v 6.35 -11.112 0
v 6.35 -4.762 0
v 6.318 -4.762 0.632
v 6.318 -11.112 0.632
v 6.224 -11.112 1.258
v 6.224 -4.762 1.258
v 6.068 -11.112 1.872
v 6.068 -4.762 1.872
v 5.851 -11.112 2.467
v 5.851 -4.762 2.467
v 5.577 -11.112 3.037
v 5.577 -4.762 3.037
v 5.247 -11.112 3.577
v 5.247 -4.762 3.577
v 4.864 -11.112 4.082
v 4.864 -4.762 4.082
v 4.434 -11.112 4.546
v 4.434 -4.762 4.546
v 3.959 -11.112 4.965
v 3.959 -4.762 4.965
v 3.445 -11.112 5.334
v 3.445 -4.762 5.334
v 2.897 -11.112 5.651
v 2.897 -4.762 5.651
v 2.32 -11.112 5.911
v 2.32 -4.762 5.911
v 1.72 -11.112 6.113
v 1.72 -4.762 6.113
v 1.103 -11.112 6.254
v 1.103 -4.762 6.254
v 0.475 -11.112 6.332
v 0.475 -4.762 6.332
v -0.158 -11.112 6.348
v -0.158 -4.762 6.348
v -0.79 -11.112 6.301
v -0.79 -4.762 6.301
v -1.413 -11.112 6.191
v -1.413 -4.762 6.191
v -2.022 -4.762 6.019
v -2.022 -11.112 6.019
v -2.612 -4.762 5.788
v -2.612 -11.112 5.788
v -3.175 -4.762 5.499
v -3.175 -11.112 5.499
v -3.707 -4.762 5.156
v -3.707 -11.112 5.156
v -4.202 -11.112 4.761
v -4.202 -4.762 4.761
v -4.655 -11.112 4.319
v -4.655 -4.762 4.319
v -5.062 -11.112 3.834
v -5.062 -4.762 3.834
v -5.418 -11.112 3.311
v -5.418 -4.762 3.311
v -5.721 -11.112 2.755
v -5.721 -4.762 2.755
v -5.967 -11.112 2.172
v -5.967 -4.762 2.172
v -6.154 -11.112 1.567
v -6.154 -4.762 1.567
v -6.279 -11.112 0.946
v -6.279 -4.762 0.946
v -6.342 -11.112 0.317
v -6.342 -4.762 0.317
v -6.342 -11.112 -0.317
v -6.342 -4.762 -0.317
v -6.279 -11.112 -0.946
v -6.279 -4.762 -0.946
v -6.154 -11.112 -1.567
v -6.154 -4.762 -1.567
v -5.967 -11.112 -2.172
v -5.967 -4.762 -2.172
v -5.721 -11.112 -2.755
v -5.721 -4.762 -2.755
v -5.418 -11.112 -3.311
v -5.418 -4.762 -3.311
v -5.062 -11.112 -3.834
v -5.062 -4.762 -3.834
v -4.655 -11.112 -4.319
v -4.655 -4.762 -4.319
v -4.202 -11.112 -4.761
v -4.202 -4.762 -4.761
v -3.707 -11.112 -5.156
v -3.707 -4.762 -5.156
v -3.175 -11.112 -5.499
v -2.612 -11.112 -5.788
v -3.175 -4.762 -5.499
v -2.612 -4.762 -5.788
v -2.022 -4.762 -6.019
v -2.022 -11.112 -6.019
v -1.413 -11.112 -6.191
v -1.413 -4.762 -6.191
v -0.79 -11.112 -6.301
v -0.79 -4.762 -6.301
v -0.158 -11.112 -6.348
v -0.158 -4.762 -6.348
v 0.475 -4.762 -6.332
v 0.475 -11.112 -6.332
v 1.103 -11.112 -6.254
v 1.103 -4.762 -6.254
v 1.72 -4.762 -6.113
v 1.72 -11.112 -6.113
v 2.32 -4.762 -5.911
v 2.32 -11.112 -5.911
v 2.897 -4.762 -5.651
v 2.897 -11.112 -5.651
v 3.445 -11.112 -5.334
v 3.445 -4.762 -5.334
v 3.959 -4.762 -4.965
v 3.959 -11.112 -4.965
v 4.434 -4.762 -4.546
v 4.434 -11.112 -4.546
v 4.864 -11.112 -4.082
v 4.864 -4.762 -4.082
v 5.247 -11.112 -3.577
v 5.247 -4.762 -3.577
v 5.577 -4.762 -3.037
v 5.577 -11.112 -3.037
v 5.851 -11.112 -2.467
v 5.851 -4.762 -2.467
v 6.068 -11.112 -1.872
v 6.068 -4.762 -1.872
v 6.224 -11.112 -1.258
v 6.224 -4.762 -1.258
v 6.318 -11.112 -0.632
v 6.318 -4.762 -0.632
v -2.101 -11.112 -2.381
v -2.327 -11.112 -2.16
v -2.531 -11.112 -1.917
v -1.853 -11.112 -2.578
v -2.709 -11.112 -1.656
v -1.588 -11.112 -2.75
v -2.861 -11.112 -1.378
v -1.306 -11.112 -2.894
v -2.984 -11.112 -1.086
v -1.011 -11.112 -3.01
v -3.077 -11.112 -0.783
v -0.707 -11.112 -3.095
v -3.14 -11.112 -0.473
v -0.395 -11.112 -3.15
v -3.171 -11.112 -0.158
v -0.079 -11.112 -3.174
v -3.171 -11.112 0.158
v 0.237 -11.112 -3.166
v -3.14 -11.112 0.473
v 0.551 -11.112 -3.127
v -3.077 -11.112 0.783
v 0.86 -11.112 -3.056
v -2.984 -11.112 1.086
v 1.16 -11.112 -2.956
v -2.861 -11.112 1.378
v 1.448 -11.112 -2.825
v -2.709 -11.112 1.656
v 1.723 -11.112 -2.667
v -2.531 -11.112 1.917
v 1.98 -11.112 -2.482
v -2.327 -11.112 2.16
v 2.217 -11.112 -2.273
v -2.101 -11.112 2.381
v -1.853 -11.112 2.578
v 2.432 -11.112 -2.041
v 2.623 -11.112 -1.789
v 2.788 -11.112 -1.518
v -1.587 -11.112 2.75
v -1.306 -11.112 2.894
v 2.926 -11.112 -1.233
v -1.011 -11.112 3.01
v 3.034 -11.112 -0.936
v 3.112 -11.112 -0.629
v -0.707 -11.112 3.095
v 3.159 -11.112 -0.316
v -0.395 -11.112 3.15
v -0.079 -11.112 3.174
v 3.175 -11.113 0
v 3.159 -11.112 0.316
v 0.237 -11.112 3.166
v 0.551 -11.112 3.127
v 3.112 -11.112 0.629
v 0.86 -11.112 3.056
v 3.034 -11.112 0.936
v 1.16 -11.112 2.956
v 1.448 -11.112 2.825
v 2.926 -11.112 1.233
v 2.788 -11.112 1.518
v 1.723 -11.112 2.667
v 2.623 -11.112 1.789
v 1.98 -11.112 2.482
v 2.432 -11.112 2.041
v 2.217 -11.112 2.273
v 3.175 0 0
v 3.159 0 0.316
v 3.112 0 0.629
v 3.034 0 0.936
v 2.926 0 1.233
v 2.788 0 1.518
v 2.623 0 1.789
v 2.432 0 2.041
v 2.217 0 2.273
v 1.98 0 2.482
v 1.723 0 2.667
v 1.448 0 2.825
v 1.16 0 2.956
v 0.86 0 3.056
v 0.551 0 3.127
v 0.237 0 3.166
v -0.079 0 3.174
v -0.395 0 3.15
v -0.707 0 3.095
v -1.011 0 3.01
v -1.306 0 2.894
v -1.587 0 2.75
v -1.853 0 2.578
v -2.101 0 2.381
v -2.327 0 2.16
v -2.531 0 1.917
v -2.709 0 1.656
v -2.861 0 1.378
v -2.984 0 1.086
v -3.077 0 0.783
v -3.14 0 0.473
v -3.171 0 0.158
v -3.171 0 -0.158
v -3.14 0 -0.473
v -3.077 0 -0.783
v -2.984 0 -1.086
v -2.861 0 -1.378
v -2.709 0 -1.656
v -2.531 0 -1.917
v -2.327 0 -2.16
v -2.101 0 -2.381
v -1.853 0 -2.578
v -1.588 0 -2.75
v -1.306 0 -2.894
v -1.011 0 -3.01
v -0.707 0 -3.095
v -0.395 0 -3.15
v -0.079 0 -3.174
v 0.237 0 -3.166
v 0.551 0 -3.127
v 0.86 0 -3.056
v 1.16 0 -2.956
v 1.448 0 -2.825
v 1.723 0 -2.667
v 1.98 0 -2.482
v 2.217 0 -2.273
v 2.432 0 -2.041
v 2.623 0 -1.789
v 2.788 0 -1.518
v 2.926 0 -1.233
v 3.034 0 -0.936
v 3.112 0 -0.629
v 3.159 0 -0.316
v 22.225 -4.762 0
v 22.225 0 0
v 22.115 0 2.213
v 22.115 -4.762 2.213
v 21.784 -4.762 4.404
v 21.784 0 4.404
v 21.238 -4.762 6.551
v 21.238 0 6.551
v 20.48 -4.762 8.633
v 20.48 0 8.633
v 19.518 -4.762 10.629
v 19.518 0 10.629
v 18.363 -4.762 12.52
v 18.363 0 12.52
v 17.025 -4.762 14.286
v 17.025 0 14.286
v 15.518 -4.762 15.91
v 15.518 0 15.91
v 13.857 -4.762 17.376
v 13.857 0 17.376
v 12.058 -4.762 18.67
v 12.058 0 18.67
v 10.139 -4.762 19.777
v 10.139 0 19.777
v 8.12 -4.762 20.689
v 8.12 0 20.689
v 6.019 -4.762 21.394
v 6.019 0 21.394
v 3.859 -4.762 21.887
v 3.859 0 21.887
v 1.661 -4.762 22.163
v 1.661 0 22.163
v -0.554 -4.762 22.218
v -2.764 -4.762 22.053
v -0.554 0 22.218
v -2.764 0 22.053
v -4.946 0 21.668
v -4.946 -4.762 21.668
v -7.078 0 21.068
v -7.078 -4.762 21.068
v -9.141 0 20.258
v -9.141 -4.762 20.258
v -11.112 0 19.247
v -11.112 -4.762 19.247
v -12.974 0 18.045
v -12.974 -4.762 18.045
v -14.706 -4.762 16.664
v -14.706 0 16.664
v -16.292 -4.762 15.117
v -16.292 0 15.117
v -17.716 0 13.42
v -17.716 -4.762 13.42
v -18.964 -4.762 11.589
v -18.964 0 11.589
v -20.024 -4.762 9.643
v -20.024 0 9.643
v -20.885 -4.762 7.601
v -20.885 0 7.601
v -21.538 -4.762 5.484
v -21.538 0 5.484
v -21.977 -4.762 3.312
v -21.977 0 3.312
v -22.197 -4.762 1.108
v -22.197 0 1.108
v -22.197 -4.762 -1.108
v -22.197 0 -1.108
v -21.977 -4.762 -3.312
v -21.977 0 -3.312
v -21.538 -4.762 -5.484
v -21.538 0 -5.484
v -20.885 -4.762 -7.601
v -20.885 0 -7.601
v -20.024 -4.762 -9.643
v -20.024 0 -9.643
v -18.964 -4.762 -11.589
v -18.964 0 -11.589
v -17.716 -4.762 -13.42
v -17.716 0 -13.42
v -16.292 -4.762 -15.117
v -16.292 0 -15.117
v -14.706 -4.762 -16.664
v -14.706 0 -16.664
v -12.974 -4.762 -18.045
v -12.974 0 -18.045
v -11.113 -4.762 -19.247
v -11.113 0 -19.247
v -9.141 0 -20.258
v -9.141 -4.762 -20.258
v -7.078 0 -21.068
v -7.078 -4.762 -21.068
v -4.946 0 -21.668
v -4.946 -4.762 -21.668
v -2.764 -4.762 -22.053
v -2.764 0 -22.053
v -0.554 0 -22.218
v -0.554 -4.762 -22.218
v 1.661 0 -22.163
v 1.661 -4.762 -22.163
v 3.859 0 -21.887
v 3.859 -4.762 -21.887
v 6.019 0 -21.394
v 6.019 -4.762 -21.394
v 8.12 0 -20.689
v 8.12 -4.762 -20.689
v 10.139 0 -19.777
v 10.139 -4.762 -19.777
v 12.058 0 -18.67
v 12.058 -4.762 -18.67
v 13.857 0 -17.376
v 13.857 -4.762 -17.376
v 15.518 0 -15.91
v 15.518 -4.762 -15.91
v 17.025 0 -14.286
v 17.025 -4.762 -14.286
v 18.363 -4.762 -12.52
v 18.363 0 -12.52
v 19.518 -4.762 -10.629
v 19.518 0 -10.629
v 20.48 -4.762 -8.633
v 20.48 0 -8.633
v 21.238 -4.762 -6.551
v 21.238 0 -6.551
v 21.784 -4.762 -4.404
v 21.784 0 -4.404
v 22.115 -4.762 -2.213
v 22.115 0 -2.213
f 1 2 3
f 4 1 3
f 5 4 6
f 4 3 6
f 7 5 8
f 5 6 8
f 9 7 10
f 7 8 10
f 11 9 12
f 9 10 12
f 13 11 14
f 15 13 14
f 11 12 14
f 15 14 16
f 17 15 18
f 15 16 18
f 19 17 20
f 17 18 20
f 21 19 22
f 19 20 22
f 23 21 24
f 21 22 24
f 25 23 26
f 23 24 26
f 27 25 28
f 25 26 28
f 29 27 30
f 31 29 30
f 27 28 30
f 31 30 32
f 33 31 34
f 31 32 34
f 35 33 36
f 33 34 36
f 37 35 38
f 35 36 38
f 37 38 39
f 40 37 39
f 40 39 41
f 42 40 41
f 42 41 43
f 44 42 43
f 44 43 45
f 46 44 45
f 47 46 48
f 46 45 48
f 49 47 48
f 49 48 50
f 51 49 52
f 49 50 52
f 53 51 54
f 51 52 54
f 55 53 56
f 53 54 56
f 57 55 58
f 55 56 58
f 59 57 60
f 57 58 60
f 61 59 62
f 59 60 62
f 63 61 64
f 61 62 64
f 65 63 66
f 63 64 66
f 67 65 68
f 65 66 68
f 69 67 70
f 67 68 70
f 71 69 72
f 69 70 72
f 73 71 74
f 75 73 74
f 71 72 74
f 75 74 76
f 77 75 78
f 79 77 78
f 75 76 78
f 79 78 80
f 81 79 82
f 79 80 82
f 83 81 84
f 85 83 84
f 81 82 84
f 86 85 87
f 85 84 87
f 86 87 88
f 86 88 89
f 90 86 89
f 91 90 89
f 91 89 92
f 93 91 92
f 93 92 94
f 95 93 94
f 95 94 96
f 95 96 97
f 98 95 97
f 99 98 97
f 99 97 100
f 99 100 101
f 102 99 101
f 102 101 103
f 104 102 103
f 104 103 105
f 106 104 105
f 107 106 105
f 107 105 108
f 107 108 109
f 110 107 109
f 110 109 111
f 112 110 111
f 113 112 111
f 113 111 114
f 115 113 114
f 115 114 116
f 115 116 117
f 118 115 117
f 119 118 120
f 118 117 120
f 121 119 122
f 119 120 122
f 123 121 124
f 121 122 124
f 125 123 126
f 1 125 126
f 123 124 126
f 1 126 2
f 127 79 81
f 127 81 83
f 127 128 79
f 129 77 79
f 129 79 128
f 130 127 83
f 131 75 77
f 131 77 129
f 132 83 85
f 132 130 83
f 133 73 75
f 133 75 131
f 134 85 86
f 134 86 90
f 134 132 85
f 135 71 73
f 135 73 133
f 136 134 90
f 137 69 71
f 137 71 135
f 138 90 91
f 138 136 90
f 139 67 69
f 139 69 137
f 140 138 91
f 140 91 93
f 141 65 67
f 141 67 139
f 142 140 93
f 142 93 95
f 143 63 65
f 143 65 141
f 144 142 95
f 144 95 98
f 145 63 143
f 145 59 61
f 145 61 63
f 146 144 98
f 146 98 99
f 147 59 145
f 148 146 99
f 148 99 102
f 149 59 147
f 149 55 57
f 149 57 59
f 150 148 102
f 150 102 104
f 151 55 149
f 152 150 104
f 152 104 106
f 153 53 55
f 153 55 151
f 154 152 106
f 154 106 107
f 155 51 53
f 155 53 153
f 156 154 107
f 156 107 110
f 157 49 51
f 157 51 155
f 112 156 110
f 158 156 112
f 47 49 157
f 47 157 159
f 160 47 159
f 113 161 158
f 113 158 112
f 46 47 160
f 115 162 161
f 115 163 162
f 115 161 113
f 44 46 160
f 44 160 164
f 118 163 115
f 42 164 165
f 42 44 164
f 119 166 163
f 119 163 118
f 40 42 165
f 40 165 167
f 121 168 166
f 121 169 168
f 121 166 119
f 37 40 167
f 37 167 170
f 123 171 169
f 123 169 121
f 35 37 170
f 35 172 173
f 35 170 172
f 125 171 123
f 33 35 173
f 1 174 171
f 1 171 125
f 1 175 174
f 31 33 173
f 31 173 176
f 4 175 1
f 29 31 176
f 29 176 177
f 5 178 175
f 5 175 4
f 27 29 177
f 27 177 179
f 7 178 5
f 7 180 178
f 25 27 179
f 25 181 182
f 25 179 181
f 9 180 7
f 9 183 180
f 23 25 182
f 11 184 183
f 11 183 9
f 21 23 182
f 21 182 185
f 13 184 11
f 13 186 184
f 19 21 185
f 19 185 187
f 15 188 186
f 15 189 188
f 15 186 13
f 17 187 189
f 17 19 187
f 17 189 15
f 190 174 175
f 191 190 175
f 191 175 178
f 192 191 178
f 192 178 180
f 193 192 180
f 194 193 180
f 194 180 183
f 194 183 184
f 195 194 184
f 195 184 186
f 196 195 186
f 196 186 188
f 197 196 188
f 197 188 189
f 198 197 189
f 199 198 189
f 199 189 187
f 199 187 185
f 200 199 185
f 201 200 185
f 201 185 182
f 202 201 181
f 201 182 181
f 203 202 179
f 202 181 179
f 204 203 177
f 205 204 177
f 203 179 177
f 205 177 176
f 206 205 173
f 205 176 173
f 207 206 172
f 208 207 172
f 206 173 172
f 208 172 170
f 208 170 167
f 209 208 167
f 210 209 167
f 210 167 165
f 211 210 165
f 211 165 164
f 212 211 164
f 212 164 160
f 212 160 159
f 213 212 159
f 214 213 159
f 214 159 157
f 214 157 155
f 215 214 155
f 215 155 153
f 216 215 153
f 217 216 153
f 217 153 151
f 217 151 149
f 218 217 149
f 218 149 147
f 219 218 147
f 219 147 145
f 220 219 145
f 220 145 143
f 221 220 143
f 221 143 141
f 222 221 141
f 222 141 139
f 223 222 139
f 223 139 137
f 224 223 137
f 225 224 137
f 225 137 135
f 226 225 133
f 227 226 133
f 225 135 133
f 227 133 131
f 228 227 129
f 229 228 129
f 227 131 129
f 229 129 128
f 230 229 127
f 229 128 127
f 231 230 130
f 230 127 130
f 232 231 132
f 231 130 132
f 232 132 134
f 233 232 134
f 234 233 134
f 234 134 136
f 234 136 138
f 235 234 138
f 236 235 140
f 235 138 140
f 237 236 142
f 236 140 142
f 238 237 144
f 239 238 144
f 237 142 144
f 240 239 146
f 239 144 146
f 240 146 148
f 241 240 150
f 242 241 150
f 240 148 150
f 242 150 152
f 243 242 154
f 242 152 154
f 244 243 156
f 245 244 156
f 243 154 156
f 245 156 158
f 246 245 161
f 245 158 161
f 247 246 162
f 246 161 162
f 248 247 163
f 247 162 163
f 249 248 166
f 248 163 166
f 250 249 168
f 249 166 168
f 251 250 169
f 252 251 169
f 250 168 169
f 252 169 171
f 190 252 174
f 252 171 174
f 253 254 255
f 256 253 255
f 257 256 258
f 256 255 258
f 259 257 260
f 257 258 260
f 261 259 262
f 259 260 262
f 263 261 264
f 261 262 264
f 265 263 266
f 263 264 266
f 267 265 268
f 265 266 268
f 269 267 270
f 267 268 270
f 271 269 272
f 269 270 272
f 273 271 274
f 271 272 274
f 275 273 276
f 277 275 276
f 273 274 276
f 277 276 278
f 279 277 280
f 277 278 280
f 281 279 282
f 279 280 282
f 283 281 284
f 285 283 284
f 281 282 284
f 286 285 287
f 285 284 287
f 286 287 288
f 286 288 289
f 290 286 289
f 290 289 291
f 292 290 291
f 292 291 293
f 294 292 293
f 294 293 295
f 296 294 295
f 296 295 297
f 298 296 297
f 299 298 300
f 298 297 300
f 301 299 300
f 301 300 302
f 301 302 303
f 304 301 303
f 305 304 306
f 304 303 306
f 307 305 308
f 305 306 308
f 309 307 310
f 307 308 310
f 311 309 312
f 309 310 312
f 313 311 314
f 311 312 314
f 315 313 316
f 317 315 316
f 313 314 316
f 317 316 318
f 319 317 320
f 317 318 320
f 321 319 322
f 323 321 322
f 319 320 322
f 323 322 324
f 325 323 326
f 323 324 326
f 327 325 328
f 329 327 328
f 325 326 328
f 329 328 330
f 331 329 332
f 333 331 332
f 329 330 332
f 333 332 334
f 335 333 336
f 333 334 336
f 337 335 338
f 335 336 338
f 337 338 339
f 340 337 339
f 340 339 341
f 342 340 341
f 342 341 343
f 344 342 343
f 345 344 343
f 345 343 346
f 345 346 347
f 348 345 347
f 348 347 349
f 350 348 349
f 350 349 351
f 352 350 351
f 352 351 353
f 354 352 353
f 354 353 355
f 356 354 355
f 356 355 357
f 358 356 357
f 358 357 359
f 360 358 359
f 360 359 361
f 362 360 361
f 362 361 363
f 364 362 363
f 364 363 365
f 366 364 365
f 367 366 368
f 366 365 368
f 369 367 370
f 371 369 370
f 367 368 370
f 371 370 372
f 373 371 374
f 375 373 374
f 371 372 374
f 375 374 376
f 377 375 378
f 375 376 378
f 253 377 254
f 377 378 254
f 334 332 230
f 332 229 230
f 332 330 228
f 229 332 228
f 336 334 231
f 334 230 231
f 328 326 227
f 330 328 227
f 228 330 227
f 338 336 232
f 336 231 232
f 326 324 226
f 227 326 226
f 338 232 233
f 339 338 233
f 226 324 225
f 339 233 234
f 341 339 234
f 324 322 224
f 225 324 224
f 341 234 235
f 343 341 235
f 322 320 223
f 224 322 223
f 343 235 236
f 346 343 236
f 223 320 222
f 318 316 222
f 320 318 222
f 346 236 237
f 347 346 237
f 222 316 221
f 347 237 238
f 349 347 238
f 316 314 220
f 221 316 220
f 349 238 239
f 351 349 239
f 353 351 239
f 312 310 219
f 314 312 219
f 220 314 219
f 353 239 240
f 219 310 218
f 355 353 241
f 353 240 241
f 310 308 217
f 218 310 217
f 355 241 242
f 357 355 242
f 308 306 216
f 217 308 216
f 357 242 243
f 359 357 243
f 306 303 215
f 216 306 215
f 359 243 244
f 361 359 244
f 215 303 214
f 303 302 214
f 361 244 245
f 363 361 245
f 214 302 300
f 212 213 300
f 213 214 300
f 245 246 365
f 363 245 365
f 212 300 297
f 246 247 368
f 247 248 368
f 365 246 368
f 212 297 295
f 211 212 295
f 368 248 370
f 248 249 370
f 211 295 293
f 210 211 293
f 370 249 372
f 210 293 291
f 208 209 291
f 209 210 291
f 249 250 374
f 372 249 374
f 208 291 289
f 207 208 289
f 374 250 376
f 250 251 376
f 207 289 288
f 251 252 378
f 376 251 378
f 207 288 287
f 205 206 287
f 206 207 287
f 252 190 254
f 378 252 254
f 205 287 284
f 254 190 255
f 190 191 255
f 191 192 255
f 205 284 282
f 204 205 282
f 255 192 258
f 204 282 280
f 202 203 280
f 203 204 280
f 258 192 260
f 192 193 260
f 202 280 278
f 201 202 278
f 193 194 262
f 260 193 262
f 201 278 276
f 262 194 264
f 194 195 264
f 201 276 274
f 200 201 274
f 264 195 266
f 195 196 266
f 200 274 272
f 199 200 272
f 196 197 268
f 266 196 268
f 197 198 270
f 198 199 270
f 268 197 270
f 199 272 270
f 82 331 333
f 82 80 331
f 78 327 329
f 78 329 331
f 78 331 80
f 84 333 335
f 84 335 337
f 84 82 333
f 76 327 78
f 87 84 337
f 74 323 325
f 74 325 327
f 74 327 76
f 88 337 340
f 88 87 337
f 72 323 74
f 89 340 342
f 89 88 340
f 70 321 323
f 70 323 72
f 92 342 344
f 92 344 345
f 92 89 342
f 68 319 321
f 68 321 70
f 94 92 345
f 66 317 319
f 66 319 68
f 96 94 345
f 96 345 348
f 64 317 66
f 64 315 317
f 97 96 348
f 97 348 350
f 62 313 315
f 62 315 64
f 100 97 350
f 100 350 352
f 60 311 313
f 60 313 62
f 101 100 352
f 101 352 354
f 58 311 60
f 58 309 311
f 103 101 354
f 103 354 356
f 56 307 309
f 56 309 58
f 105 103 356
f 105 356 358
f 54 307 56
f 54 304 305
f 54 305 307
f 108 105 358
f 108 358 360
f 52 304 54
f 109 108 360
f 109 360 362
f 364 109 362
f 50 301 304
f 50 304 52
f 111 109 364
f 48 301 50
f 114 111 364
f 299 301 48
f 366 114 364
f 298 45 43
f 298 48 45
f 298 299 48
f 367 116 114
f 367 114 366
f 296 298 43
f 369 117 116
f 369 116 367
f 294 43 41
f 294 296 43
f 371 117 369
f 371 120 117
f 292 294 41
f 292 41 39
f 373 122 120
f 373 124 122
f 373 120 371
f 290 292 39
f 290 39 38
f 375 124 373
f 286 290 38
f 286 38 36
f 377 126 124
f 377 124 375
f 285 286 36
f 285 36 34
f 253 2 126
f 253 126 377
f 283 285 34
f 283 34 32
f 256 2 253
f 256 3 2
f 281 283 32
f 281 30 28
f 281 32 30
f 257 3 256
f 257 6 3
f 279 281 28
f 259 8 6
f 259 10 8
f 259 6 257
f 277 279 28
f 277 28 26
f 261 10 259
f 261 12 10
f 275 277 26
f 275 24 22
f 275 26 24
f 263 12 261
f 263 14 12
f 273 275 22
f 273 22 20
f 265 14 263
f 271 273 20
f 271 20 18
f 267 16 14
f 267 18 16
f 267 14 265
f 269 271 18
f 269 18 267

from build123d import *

# Parameters (mm, degrees)
F0_R          = 22.225
F1_DEPTH      = 4.7625
F2_R          = 6.35
F3_DEPTH      = 6.35
F4_R          = 3.175
F5_DEPTH      = 25.4
F5_DEPTH_BACK = 73


# Not quite as in the source:
# - an extrude ends at something that could not be found from the text; its depth is read off the source's solid


with BuildPart() as f1:
    # F0 (on Front) → F1 (new body)
    with BuildSketch(Plane.XZ):
        Circle(F0_R)
    extrude(amount=F1_DEPTH)

    # F2 (on face) → F3 (join)
    with BuildSketch(Plane.XZ.offset(4.7625)):
        Circle(F2_R)
    extrude(amount=F3_DEPTH)

    # F4 (on face) → F5 (cut, two sides)
    with BuildSketch(Plane.XZ.offset(11.1125)) as f5_sk:
        Circle(F4_R)
    extrude(amount=-F5_DEPTH, mode=Mode.SUBTRACT)
    extrude(f5_sk.sketch, amount=F5_DEPTH_BACK, mode=Mode.SUBTRACT)


solid = f1.part
